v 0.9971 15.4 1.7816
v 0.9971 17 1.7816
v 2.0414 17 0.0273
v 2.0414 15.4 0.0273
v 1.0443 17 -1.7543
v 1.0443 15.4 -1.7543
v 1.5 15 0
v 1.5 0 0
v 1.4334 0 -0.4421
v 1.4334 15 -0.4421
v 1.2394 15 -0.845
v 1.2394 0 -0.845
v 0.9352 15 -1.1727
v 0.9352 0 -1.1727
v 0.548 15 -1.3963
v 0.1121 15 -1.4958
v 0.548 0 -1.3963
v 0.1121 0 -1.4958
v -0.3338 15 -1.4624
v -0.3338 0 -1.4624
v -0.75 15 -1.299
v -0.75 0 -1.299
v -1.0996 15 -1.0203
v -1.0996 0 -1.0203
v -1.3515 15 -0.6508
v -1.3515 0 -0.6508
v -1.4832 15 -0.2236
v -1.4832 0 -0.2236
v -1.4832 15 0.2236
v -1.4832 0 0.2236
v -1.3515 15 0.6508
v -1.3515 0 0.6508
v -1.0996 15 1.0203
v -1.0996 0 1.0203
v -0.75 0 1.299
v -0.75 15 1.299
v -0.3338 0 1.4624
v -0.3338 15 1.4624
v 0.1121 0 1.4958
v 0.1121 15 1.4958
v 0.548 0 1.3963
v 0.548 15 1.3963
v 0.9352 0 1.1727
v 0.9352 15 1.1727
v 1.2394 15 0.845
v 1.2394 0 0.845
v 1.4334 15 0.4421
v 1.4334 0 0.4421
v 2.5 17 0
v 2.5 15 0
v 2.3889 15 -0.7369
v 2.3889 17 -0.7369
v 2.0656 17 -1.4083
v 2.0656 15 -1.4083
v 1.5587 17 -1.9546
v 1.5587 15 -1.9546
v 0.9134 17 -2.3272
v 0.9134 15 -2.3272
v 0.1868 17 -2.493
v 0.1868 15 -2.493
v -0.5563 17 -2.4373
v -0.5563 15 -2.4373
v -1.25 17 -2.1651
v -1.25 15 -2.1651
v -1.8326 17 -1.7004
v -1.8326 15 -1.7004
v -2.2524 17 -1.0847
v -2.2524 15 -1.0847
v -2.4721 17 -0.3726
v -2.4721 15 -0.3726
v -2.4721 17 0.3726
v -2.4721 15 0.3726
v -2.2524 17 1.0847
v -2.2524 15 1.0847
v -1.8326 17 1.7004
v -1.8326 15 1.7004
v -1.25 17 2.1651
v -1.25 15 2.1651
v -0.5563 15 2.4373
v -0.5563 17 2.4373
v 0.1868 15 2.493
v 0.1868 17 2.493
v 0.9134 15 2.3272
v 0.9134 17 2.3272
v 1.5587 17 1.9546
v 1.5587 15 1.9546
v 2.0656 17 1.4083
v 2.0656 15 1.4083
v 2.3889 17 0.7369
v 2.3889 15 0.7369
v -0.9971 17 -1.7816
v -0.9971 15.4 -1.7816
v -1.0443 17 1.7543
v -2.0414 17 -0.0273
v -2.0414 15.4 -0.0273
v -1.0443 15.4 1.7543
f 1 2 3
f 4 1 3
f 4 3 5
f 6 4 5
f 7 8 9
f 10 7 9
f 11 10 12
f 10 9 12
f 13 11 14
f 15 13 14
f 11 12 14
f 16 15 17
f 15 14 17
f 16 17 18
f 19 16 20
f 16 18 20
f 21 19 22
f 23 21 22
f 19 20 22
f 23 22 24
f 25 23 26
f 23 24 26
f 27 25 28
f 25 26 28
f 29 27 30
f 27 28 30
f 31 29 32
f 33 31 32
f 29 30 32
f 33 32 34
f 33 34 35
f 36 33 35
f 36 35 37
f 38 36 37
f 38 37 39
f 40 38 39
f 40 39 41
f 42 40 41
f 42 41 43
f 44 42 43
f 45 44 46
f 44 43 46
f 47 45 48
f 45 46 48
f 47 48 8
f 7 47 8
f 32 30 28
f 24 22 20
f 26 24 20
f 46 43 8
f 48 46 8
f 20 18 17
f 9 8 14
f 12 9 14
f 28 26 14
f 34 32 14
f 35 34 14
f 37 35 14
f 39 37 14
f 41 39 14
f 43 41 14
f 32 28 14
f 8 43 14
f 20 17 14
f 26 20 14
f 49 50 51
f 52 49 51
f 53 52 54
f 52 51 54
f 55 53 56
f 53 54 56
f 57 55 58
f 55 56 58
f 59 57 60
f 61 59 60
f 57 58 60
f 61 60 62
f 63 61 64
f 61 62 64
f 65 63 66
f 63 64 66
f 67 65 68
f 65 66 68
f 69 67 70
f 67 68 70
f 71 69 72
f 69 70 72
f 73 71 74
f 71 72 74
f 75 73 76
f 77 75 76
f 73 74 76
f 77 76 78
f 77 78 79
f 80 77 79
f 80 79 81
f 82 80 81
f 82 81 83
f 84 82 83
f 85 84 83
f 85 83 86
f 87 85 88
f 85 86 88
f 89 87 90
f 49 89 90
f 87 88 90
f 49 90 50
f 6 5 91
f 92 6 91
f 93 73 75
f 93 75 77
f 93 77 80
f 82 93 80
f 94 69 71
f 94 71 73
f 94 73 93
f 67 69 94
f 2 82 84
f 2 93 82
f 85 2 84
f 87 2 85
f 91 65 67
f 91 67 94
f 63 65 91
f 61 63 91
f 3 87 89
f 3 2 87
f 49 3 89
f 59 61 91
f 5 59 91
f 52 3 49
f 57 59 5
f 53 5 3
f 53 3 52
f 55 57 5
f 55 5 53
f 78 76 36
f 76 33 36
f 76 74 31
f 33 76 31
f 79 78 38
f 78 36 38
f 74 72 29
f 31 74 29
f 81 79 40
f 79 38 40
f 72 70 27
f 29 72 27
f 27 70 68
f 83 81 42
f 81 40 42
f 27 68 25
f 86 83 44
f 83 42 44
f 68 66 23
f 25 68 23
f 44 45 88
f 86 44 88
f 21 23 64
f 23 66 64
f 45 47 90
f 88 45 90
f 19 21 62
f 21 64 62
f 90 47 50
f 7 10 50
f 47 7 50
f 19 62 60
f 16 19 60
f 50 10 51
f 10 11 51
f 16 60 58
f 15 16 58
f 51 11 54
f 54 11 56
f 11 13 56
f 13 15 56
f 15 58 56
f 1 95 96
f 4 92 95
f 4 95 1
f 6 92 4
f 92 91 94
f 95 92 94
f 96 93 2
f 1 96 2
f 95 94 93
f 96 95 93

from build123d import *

# Parameters (mm, degrees)
SKETCH1_R           = 1.5
BOSS_EXTRUDE1_DEPTH = 15
SKETCH2_R           = 2.5
BOSS_EXTRUDE2_DEPTH = 2
CUT_EXTRUDE2_DEPTH  = 1.6


with BuildPart() as part:
    # Sketch1 → Boss-Extrude1 (new body)
    with BuildSketch(Plane(origin=(0, 0, 0), x_dir=(1, 0, 0), z_dir=(0, 1, 0))):
        Circle(SKETCH1_R)
    extrude(amount=BOSS_EXTRUDE1_DEPTH)

    # Sketch2 → Boss-Extrude2 (add)
    with BuildSketch(Plane(origin=(0, 15, 0), x_dir=(1, 0, 0), z_dir=(0, 1, 0))):
        Circle(SKETCH2_R)
    extrude(amount=BOSS_EXTRUDE2_DEPTH)

    # Sketch3 → Cut-Extrude2 (cut)
    with BuildSketch(Plane(origin=(0, 17, 0), x_dir=(1, 0, 0), z_dir=(0, 1, 0))):
        Polygon((0.997116077, -1.781560543), (2.041434727, -0.027252418), (1.04431865, 1.754308125), (-0.997116077, 1.781560543), (-2.041434727, 0.027252418), (-1.04431865, -1.754308125), align=None)
    extrude(amount=-CUT_EXTRUDE2_DEPTH, mode=Mode.SUBTRACT)


solid = part.part
